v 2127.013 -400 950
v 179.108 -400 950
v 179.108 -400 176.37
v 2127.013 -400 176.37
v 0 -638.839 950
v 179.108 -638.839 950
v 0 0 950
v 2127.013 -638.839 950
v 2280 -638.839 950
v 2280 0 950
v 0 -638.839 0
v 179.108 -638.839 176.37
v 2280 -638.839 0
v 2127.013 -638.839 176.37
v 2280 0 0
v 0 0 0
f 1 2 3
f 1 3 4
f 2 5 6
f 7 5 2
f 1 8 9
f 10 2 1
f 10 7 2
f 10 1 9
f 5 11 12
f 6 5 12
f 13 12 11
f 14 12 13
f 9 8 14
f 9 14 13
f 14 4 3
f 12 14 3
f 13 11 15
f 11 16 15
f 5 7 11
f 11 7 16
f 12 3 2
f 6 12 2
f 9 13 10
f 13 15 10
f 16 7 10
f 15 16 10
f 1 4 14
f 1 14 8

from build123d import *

# Parameters (mm, degrees)
F0_W     = 2280
F0_H     = 950
F1_DEPTH = 400
F2_W     = 179.1080534458
F2_H     = 773.6296027899
F2_H_2   = 176.3703972101
F2_W_2   = 1947.9051530361
F2_W_3   = 152.9867935181
F3_DEPTH = 238.83933


with BuildPart() as f1:
    # F0 (on Front) → F1 (new body)
    with BuildSketch(Plane.XZ):
        with Locations((1140, 475)):
            Rectangle(F0_W, F0_H)
    extrude(amount=F1_DEPTH)

    # F2 (on face) → F3 (join)
    with BuildSketch(Plane.XZ.offset(400)):
        with Locations((89.5540267229, 563.1851986051)):
            Rectangle(F2_W, F2_H)
        with Locations((89.5540267229, 88.1851986051)):
            Rectangle(F2_W, F2_H_2)
        with Locations((1153.0606299639, 88.1851986051)):
            Rectangle(F2_W_2, F2_H_2)
        with Locations((2203.506603241, 88.1851986051)):
            Rectangle(F2_W_3, F2_H_2)
        with Locations((2203.506603241, 563.1851986051)):
            Rectangle(F2_W_3, F2_H)
    extrude(amount=F3_DEPTH)


solid = f1.part
